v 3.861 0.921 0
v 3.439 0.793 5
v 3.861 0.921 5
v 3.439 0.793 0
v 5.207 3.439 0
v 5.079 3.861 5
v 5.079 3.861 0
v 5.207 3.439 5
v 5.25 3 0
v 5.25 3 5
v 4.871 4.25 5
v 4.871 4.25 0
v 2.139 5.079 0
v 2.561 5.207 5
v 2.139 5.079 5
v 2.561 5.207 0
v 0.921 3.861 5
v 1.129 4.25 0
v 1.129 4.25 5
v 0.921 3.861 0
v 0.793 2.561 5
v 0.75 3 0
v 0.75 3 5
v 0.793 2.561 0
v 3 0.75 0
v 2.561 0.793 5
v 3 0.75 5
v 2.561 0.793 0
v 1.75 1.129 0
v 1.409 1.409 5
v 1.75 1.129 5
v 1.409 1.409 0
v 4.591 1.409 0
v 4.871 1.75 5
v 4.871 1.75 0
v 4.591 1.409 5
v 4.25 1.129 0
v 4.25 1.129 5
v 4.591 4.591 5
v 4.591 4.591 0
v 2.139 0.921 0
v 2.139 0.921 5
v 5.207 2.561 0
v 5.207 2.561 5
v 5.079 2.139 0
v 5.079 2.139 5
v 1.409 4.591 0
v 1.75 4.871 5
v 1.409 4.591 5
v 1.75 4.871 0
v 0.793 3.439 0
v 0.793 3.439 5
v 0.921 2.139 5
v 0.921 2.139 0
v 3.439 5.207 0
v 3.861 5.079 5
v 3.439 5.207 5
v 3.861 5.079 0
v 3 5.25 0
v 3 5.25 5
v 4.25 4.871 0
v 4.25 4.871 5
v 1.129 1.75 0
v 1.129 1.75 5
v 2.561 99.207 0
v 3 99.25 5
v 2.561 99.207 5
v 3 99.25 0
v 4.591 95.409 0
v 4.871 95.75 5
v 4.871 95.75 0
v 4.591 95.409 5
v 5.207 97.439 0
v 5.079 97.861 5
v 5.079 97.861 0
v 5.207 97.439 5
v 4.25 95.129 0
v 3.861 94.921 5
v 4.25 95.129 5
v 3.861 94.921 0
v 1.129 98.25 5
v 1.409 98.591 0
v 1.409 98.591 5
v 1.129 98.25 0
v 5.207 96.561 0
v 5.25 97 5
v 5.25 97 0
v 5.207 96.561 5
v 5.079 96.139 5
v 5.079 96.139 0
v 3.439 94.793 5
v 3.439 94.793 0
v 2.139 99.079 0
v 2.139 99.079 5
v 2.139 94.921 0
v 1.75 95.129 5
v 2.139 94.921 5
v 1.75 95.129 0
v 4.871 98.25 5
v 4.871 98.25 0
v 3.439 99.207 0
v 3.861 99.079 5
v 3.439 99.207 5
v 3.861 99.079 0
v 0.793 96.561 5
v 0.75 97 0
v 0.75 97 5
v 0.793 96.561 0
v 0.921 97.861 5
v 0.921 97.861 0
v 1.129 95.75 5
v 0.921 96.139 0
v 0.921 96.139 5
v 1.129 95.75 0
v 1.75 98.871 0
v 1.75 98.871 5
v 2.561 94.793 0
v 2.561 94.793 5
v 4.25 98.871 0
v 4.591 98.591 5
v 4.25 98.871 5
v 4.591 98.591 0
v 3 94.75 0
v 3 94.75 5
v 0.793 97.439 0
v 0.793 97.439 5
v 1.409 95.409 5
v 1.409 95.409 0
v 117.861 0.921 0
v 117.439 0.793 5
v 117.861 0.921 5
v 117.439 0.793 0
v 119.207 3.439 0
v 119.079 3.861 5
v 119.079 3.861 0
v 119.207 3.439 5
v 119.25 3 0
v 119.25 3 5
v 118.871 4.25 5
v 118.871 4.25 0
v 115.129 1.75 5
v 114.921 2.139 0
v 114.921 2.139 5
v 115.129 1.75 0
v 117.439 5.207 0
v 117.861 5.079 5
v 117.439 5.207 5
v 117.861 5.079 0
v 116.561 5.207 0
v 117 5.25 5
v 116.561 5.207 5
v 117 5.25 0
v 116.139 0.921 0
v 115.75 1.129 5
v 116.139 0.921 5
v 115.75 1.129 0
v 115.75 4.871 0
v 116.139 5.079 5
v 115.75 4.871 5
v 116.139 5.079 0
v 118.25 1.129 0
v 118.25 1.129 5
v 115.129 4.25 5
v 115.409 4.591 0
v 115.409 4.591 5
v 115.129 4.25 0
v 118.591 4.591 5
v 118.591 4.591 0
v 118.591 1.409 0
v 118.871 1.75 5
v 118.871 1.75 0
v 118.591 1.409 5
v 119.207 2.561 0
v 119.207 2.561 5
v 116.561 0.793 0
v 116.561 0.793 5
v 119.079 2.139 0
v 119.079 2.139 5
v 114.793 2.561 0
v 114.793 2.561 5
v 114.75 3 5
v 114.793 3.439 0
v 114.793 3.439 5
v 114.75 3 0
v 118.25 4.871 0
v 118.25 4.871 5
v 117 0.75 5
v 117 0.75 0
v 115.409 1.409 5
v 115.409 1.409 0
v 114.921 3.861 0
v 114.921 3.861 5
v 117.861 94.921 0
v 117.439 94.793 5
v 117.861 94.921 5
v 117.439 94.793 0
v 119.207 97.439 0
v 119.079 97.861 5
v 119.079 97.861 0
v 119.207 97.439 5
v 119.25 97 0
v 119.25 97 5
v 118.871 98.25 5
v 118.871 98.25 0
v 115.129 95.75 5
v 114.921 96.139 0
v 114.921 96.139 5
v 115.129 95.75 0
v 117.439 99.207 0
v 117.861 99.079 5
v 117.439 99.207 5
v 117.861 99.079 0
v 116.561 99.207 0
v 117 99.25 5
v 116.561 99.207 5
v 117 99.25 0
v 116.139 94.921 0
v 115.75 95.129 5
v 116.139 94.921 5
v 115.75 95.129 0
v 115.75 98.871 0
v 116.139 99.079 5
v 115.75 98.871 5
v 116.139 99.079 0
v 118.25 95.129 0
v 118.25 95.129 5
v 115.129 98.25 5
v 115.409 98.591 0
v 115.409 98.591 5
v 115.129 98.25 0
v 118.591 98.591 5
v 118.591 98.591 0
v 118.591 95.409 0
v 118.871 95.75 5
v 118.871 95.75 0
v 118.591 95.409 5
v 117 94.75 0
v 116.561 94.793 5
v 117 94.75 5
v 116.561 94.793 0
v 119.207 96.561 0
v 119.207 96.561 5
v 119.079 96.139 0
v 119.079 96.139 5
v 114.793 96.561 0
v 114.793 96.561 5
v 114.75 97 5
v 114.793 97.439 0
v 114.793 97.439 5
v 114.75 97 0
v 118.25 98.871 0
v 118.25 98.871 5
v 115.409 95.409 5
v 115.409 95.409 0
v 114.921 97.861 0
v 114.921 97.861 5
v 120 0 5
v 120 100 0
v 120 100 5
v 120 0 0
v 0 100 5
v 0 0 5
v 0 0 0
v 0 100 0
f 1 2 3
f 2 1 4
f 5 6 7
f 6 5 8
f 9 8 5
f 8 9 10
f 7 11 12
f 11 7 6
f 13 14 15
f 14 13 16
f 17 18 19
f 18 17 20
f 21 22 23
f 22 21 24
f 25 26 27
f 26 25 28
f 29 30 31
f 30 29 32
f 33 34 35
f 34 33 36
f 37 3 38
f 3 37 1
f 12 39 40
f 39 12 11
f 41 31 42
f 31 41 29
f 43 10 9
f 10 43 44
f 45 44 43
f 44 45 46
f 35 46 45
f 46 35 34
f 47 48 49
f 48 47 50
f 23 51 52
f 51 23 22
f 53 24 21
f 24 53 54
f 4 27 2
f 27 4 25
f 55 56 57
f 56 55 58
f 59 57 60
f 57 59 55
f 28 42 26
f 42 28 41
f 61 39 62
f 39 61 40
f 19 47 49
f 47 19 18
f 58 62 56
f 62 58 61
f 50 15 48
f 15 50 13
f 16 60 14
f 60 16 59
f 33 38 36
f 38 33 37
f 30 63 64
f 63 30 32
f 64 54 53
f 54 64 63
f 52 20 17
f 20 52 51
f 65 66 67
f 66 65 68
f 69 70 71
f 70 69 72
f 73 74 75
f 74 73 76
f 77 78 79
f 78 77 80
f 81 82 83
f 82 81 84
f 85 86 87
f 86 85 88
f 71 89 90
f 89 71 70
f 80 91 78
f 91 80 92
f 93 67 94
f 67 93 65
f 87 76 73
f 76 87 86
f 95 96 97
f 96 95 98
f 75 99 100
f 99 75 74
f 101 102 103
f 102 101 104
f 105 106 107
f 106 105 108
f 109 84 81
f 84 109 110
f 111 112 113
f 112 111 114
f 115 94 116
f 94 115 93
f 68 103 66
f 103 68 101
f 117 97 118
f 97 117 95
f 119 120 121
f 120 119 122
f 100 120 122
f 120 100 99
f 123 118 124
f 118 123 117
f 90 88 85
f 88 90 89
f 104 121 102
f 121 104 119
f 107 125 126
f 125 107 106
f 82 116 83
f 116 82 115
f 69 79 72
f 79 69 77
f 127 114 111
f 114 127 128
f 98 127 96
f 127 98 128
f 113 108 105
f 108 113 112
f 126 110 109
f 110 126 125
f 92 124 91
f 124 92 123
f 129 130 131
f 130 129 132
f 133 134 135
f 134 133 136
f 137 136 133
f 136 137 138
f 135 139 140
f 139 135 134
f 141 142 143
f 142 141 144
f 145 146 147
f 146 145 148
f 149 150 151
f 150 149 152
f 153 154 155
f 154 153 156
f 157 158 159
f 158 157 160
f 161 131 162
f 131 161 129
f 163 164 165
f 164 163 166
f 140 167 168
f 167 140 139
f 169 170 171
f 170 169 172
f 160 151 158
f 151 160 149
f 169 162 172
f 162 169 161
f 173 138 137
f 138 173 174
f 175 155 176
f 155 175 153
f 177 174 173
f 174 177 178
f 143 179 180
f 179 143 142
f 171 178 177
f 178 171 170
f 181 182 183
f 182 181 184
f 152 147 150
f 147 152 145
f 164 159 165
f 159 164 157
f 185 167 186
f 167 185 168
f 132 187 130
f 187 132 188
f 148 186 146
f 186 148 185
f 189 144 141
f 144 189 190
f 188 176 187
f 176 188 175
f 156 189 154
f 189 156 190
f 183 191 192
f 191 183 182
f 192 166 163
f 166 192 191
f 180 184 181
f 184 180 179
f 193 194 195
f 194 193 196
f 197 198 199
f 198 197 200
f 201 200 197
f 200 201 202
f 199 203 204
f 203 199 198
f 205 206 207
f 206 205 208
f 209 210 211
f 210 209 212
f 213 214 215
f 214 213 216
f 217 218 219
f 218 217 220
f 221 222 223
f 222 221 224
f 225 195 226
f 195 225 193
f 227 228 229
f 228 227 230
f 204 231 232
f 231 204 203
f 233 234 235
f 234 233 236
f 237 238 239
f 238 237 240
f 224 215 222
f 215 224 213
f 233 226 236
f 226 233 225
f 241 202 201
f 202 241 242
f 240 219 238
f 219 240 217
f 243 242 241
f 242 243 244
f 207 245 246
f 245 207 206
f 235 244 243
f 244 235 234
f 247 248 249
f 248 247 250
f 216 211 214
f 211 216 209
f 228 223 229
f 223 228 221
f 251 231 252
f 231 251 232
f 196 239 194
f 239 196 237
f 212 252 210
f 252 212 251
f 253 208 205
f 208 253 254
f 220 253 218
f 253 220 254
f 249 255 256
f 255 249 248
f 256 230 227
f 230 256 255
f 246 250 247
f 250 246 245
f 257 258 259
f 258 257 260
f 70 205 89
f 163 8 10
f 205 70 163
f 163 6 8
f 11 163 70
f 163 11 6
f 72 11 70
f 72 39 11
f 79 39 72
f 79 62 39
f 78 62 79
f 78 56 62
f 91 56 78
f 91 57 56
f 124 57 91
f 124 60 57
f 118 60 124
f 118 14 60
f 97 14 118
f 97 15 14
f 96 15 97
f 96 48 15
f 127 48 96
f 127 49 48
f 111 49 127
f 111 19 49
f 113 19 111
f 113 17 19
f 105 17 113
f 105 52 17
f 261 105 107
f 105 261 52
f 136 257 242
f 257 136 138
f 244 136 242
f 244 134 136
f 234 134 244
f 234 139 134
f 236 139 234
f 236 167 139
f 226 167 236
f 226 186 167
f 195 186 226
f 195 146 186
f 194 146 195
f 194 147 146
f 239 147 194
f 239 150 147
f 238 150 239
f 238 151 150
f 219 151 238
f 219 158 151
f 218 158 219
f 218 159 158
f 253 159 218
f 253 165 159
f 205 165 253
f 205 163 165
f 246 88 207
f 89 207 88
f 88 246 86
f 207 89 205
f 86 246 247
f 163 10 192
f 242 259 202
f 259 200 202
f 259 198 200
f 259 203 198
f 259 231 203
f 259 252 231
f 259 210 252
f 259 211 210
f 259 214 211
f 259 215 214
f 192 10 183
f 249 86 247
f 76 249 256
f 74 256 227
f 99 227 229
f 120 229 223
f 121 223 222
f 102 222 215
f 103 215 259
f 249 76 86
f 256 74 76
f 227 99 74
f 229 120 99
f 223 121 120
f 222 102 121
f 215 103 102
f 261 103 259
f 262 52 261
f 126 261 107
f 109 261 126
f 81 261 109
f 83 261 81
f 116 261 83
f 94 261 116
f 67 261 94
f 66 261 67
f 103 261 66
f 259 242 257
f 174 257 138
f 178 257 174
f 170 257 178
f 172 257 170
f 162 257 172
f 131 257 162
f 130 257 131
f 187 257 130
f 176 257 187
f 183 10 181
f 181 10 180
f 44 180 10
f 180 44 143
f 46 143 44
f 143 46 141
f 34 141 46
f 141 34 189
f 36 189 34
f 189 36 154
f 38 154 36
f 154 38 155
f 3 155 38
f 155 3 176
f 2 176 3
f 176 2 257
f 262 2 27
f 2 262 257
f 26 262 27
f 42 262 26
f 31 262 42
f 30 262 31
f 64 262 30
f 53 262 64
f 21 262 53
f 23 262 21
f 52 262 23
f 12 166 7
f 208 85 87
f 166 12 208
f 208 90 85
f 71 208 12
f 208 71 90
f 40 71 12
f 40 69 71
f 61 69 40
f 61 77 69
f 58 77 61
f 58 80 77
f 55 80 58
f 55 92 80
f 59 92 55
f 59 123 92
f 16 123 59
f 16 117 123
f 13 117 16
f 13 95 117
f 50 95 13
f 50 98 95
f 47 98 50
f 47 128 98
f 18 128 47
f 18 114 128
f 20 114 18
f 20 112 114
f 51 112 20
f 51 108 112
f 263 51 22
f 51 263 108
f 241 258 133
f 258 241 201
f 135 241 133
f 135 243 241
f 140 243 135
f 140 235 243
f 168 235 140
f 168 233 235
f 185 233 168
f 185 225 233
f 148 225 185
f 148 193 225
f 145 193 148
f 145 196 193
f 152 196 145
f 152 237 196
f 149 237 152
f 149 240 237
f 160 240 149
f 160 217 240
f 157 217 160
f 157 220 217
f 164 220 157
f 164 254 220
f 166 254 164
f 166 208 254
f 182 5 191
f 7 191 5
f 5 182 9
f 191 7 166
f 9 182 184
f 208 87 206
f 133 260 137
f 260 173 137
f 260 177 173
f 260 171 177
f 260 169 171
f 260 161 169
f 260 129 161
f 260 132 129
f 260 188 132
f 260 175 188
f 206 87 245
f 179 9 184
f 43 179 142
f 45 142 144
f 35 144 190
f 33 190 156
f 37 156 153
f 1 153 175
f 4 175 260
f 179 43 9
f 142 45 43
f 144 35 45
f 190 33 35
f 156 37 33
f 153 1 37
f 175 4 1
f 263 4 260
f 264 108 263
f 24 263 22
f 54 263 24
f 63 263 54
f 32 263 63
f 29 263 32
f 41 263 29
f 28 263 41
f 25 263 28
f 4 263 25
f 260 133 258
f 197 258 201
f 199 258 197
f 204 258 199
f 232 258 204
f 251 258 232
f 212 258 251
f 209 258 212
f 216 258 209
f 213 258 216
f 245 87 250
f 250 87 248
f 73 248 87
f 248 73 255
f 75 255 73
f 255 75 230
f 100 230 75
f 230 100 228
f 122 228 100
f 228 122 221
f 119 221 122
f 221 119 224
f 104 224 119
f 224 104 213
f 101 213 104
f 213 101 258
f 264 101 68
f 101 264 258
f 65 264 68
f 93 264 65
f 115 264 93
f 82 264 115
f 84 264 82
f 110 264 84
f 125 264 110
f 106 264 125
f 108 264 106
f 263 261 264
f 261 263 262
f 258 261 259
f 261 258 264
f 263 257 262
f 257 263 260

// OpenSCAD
$fn = 32;

// ----------------------------------------------------------------------
// Enclosure lid: 120 x 100 x 5 mm, 4 bolt holes
// ----------------------------------------------------------------------

// --- parameters (mm) ---
length = 120;             // lid length, X
width = 100;              // lid width, Y
plate_t = 5;              // lid plate thickness
bolt_d = 4.5;             // bolt clearance
boss_lip = 3;             // bolt hole inset from the corner
sink = 1;                 // overlap of the lip and ribs into the plate

module plate() {
  cube([length, width, plate_t]);
}

difference() {
  plate();
  /* bolt pattern matching the corner bosses */
  for (sx = [0, 1]) for (sy = [0, 1])
    translate([sx * (length - 2 * boss_lip) + boss_lip, sy * (width - 2 * boss_lip) + boss_lip, -0 - 1])
      cylinder(h = plate_t + 0 + 2, d = bolt_d);
}
